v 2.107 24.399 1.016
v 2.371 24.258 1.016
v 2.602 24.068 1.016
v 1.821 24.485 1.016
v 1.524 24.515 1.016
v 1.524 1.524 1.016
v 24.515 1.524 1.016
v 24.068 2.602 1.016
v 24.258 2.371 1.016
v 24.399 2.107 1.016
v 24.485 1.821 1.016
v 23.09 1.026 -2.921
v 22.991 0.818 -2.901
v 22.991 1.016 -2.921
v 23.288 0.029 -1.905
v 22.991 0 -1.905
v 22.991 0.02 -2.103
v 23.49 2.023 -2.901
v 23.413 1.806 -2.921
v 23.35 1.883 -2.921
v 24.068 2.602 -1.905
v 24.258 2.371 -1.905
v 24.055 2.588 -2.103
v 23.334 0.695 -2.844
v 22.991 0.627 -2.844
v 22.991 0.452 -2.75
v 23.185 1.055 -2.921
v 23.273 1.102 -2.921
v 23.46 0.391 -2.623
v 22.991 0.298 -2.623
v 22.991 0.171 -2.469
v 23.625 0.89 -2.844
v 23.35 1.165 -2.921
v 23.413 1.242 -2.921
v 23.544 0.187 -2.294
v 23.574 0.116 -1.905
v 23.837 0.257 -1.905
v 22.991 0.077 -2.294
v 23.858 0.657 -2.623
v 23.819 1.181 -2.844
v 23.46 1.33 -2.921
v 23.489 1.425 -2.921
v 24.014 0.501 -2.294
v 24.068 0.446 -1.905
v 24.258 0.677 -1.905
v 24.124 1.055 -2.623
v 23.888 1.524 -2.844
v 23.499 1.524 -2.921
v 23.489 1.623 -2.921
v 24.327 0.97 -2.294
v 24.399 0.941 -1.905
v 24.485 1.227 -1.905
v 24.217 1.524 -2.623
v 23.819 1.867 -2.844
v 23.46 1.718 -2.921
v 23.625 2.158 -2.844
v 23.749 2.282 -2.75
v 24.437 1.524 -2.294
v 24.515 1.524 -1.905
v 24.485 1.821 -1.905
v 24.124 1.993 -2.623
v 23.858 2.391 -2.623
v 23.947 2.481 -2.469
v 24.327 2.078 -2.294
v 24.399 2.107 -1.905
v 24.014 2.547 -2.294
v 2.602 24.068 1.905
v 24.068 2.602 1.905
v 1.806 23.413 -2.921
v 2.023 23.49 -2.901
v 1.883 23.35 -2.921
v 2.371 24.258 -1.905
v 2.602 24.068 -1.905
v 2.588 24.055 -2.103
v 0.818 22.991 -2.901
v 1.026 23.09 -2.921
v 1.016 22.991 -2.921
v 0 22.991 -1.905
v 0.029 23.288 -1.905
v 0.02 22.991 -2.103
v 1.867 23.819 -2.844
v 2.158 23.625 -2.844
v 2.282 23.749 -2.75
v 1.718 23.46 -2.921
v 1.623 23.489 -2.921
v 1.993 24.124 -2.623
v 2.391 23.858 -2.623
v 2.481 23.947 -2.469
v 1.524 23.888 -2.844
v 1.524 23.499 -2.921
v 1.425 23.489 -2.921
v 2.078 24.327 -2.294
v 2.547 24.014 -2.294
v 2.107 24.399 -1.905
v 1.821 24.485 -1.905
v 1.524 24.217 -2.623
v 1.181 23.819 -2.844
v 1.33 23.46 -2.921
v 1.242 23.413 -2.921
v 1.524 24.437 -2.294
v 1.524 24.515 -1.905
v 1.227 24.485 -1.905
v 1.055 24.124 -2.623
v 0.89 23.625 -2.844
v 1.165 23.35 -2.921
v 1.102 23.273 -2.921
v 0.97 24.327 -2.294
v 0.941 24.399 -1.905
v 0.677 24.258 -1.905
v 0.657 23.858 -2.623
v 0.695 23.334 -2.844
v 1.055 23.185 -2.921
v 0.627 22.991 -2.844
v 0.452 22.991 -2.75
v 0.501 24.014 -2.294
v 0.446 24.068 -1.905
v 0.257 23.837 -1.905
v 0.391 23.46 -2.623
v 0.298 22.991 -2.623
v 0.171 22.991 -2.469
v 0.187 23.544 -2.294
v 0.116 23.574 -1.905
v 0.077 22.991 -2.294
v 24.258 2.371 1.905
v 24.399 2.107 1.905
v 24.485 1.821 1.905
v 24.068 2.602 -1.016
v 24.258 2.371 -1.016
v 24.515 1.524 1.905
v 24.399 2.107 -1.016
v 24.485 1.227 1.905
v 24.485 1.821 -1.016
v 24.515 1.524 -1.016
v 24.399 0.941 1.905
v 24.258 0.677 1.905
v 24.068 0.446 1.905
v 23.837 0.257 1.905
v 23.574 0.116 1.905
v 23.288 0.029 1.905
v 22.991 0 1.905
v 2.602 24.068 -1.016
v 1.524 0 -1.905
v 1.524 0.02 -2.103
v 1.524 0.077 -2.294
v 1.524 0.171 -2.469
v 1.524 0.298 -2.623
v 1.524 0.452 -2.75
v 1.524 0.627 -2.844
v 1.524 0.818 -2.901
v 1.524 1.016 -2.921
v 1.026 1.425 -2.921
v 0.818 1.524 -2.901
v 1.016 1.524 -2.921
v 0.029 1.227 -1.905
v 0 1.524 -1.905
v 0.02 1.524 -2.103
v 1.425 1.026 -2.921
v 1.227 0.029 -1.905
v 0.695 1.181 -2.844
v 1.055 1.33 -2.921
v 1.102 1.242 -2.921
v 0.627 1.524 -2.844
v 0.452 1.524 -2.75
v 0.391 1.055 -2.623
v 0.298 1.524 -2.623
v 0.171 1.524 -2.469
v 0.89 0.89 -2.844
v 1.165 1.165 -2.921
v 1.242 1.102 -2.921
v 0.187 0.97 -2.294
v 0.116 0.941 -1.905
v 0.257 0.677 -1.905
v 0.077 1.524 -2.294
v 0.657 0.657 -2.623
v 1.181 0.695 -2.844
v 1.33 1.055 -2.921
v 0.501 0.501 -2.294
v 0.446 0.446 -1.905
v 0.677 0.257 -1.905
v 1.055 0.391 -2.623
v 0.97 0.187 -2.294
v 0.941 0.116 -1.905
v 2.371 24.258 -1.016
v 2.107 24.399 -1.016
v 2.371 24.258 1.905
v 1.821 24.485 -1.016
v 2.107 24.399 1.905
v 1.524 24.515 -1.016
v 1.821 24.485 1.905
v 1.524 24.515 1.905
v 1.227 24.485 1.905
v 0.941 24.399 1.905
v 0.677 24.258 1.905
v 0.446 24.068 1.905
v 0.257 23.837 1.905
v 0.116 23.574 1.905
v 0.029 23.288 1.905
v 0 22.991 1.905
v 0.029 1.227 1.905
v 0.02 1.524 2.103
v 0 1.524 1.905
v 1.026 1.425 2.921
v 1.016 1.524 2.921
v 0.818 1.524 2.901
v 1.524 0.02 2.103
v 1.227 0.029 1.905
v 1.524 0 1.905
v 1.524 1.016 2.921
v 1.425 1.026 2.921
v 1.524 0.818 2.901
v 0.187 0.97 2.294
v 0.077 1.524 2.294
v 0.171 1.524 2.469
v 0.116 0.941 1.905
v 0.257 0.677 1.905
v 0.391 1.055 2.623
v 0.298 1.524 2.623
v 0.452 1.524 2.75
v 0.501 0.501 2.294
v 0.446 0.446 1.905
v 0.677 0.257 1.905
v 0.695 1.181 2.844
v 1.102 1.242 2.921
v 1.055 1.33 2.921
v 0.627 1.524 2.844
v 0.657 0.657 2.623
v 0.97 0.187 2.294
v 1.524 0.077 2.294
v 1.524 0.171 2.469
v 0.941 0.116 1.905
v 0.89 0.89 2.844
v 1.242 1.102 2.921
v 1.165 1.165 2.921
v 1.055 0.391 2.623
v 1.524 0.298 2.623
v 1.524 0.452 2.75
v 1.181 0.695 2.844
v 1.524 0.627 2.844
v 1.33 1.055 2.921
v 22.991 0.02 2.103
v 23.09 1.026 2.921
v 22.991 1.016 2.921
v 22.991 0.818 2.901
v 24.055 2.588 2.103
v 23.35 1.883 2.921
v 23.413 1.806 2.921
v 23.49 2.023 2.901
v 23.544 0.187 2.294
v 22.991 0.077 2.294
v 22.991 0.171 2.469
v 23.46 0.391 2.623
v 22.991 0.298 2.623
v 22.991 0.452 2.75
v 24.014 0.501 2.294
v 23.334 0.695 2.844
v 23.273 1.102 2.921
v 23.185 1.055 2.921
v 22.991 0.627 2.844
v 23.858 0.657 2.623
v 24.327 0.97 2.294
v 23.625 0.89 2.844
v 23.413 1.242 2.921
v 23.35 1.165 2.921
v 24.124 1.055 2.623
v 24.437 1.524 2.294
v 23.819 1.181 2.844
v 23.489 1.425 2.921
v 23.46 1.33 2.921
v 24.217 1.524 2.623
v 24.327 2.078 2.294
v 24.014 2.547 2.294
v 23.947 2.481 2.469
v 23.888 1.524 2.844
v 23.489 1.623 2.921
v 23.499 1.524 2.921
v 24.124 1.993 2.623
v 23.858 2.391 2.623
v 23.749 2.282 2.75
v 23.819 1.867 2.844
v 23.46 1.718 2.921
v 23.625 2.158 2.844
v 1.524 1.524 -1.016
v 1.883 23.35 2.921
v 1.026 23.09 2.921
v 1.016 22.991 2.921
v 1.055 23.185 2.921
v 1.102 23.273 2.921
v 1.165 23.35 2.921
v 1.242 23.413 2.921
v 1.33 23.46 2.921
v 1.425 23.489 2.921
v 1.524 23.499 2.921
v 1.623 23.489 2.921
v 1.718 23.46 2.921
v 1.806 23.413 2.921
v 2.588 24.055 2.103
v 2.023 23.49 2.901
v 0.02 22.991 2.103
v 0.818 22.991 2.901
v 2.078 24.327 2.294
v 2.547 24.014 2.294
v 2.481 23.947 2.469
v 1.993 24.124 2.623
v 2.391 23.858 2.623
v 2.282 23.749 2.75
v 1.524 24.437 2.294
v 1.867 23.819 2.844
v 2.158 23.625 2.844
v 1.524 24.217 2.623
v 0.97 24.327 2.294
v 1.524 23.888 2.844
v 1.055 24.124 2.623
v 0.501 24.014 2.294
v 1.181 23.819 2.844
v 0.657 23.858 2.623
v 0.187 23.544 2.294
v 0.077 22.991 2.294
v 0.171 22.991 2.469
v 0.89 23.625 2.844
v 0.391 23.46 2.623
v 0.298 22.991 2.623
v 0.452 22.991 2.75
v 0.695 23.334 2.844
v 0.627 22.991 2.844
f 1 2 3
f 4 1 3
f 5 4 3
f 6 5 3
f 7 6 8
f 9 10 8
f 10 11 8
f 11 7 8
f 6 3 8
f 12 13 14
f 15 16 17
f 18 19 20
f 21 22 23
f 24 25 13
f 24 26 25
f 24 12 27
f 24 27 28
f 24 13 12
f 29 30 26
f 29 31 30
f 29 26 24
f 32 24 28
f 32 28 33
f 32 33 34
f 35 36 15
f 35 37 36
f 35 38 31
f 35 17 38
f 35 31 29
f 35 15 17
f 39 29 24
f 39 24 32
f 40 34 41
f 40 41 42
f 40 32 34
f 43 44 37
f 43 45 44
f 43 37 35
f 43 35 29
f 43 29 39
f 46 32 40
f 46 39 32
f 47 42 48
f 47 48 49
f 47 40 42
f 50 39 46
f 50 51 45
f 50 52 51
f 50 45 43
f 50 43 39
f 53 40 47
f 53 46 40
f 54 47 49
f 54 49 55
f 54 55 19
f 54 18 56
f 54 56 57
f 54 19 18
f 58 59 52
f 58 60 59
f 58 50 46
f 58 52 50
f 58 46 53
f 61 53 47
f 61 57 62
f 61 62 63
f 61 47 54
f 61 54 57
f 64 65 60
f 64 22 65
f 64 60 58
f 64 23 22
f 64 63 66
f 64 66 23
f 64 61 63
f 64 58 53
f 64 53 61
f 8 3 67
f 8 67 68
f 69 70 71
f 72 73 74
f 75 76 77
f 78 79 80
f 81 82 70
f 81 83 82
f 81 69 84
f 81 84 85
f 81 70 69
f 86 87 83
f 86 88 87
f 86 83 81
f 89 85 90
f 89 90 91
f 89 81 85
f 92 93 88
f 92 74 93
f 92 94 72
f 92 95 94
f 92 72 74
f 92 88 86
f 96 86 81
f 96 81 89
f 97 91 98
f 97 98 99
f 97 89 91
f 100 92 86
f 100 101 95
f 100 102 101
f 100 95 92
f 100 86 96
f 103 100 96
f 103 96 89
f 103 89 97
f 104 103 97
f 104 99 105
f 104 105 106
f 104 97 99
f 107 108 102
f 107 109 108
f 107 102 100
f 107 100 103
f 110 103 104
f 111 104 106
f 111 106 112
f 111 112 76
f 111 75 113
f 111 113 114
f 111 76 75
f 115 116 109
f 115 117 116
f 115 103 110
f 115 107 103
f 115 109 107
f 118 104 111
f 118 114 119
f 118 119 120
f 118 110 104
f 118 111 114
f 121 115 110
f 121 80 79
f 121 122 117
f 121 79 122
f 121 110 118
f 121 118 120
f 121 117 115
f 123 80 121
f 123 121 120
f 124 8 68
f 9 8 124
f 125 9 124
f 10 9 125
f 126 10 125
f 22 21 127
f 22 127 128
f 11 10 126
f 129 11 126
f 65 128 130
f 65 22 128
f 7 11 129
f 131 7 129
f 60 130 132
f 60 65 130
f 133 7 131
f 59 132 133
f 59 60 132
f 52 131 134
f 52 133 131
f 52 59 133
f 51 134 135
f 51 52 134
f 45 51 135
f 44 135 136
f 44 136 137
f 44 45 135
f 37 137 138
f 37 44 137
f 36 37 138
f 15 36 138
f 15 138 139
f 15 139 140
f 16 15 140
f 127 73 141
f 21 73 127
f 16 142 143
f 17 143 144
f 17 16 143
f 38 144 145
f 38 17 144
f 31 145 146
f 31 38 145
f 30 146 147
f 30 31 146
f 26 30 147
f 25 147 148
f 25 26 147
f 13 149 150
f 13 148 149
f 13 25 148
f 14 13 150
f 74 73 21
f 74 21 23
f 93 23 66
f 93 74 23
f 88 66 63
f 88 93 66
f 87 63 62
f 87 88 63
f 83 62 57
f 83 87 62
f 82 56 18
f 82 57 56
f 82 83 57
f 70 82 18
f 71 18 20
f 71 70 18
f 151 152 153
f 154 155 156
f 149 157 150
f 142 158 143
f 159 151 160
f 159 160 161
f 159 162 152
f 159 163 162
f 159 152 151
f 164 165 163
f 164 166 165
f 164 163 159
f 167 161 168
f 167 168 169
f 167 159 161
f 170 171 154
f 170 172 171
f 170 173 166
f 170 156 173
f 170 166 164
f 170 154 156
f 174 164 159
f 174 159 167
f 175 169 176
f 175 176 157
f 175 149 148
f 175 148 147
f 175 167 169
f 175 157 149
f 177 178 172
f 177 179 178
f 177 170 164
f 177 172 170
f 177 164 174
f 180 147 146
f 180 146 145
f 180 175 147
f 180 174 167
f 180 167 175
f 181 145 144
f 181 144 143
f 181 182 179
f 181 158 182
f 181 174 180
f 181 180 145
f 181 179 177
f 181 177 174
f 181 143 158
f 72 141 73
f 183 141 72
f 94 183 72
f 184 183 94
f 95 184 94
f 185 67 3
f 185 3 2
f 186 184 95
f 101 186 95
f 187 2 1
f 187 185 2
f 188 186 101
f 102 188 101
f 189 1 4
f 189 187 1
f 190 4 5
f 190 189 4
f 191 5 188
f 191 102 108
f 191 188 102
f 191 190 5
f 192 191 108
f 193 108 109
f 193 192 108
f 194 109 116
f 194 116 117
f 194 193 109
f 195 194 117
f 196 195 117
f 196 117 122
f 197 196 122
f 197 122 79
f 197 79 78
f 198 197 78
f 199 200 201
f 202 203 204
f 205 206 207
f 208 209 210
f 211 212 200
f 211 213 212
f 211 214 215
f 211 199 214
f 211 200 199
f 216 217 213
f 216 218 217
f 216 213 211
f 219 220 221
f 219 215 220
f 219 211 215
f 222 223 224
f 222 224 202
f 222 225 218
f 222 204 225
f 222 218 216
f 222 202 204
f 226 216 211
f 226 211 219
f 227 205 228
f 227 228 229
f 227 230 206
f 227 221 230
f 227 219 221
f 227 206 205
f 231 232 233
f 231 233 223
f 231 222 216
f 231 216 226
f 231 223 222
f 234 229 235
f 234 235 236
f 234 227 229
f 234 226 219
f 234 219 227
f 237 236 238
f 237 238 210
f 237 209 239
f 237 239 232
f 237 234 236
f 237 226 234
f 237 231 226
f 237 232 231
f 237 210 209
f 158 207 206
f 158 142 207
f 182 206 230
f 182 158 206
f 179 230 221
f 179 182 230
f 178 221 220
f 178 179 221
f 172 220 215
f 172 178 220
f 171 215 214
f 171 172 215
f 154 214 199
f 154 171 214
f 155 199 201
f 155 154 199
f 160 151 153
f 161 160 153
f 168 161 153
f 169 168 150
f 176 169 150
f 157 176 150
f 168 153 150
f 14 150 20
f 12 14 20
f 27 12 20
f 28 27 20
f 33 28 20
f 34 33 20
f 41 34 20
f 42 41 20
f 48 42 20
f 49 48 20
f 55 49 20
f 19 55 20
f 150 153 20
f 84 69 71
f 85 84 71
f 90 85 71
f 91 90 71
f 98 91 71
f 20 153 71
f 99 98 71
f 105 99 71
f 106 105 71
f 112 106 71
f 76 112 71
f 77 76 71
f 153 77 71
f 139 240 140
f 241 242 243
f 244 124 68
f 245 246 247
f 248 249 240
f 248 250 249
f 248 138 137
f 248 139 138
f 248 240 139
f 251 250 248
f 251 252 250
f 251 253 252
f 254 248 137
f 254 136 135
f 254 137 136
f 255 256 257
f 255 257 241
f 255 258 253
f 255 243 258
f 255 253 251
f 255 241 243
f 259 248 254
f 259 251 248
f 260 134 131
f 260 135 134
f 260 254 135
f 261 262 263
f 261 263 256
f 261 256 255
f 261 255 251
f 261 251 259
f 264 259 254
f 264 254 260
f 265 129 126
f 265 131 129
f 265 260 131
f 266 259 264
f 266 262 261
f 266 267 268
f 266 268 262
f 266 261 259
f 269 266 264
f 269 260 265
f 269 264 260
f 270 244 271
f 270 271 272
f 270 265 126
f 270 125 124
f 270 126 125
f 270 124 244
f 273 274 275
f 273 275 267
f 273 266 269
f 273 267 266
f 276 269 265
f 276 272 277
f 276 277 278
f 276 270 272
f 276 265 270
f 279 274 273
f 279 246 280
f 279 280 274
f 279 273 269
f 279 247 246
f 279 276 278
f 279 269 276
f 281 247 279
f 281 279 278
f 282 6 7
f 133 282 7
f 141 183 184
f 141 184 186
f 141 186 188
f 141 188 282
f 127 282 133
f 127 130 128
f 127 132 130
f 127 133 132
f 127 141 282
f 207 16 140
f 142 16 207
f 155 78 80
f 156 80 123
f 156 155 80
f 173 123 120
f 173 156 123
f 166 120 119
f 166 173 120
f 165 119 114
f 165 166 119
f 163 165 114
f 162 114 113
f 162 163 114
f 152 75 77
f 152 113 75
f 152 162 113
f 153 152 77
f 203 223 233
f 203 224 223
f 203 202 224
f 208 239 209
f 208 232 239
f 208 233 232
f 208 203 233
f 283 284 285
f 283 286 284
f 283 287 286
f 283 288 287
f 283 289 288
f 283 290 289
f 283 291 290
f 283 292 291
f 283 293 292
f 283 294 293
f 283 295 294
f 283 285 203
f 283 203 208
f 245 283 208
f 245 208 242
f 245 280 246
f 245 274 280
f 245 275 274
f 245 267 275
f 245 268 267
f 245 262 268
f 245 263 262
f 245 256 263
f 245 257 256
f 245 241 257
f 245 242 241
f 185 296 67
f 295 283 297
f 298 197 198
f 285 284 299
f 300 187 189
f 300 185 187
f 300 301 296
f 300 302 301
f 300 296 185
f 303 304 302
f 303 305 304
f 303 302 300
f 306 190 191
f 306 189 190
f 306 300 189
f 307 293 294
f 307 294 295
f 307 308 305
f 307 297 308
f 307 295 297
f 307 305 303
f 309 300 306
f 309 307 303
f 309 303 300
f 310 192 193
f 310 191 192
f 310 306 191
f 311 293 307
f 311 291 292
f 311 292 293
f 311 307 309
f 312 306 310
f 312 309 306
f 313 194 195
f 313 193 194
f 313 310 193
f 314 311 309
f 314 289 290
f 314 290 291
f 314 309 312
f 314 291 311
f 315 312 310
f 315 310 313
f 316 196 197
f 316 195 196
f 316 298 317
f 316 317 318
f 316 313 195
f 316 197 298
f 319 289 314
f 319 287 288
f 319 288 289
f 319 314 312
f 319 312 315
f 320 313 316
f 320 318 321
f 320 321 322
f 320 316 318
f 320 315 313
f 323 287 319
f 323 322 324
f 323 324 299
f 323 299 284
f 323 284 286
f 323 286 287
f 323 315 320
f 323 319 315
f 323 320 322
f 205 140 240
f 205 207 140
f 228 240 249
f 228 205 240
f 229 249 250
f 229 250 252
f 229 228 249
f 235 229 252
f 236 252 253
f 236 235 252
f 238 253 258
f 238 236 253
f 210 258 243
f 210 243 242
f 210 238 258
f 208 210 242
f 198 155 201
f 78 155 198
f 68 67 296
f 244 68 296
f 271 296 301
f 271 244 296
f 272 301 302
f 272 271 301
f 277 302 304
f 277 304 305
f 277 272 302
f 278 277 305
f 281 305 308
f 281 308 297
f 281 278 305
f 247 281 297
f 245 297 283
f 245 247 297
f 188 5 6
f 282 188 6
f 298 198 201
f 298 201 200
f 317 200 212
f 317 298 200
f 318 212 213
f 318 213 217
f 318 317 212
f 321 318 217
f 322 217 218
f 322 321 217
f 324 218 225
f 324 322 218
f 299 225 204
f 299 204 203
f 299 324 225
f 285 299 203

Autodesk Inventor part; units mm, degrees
ref_plane "YZ Plane" through (0, 0, 0) normal (1, 0, 0) x (0, 1, 0)
ref_plane "XZ Plane" through (0, 0, 0) normal (0, 1, 0) x (-1, 0, 0)
ref_plane "XY Plane" through (0, 0, 0) normal (0, 0, 1) x (1, 0, 0)
sketch "Sketch1" plane through (0, 0, 0) normal (0, 0, 1) x (1, 0, 0)
  line L0 (0, 0) -> (-13.377, 0)
  line L1 (0, 0) -> (0, 26.67)
  line L2 (0, 26.67) -> (26.67, 0)
  line L3 (26.67, 0) -> (0, 0)
  dimension "d0" = 26.67
extrude "Extrusion1" add sketch "Sketch1" along normal mid plane 5.842
sketch "Sketch3" plane through (0, 0, 0) normal (0, 0, 1) x (1, 0, 0)
  line L0 (0, 26.67) -> (26.67, 0) projected
  line L1 (0, 0) -> (0, 26.67) projected
  line L2 (26.67, 0) -> (0, 0) projected
  line L3 (1.524, 25.146) -> (1.524, 1.524)
  line L4 (1.524, 1.524) -> (25.146, 1.524)
  line L5 (1.524, 25.146) -> (25.146, 1.524)
  dimension "d3" = 1.524
  dimension "d4" = 1.524
extrude "Extrusion2" cut sketch "Sketch3" against normal mid plane 2.032 contours L0 L4 L3
fillet "Fillet1" radius 1.524 3 edges at (0, 26.67, 0) (0, 0, 0) (26.67, 0, 0)
fillet "Fillet2" radius 1.016 6 edges at (0.4464, 0.4464, 2.921) (12.2574, 0, 2.921) (24.3987, 0.9408, 2.921) (13.335, 13.335, 2.921) (0.9408, 24.3987, 2.921) (0, 12.2574, 2.921)
fillet "Fillet3" radius 1.016 6 edges at (0.9408, 24.3987, -2.921) (13.335, 13.335, -2.921) (24.3987, 0.9408, -2.921) (12.2574, 0, -2.921) (0.4464, 0.4464, -2.921) (0, 12.2574, -2.921)
equation "\"d0\" = edgeSize"
equation "\"d1\" = partThickness"
equation "\"d3\" = edgeThickness"
equation "\"d4\" = edgeThickness"
equation "\"d5\" = mirrorThickness"
equation "\"d7\" = filetForCorners"
equation "\"d8\" = filetForFlat"
equation "\"d9\" = filetForFlat"
equation "\"edgeSize\" = 26.67"
equation "\"wallThickness\" = 1.905"
equation "\"mirrorThickness\" = 2.032"
equation "\"partThickness\" = mirrorThickness + 2 * wallThickness"
equation "\"edgeThickness\" = 1.524"
equation "\"filetForCorners\" = 1.524"
equation "\"filetForFlat\" = 1.016"
properties part number "Mirror Corner"
